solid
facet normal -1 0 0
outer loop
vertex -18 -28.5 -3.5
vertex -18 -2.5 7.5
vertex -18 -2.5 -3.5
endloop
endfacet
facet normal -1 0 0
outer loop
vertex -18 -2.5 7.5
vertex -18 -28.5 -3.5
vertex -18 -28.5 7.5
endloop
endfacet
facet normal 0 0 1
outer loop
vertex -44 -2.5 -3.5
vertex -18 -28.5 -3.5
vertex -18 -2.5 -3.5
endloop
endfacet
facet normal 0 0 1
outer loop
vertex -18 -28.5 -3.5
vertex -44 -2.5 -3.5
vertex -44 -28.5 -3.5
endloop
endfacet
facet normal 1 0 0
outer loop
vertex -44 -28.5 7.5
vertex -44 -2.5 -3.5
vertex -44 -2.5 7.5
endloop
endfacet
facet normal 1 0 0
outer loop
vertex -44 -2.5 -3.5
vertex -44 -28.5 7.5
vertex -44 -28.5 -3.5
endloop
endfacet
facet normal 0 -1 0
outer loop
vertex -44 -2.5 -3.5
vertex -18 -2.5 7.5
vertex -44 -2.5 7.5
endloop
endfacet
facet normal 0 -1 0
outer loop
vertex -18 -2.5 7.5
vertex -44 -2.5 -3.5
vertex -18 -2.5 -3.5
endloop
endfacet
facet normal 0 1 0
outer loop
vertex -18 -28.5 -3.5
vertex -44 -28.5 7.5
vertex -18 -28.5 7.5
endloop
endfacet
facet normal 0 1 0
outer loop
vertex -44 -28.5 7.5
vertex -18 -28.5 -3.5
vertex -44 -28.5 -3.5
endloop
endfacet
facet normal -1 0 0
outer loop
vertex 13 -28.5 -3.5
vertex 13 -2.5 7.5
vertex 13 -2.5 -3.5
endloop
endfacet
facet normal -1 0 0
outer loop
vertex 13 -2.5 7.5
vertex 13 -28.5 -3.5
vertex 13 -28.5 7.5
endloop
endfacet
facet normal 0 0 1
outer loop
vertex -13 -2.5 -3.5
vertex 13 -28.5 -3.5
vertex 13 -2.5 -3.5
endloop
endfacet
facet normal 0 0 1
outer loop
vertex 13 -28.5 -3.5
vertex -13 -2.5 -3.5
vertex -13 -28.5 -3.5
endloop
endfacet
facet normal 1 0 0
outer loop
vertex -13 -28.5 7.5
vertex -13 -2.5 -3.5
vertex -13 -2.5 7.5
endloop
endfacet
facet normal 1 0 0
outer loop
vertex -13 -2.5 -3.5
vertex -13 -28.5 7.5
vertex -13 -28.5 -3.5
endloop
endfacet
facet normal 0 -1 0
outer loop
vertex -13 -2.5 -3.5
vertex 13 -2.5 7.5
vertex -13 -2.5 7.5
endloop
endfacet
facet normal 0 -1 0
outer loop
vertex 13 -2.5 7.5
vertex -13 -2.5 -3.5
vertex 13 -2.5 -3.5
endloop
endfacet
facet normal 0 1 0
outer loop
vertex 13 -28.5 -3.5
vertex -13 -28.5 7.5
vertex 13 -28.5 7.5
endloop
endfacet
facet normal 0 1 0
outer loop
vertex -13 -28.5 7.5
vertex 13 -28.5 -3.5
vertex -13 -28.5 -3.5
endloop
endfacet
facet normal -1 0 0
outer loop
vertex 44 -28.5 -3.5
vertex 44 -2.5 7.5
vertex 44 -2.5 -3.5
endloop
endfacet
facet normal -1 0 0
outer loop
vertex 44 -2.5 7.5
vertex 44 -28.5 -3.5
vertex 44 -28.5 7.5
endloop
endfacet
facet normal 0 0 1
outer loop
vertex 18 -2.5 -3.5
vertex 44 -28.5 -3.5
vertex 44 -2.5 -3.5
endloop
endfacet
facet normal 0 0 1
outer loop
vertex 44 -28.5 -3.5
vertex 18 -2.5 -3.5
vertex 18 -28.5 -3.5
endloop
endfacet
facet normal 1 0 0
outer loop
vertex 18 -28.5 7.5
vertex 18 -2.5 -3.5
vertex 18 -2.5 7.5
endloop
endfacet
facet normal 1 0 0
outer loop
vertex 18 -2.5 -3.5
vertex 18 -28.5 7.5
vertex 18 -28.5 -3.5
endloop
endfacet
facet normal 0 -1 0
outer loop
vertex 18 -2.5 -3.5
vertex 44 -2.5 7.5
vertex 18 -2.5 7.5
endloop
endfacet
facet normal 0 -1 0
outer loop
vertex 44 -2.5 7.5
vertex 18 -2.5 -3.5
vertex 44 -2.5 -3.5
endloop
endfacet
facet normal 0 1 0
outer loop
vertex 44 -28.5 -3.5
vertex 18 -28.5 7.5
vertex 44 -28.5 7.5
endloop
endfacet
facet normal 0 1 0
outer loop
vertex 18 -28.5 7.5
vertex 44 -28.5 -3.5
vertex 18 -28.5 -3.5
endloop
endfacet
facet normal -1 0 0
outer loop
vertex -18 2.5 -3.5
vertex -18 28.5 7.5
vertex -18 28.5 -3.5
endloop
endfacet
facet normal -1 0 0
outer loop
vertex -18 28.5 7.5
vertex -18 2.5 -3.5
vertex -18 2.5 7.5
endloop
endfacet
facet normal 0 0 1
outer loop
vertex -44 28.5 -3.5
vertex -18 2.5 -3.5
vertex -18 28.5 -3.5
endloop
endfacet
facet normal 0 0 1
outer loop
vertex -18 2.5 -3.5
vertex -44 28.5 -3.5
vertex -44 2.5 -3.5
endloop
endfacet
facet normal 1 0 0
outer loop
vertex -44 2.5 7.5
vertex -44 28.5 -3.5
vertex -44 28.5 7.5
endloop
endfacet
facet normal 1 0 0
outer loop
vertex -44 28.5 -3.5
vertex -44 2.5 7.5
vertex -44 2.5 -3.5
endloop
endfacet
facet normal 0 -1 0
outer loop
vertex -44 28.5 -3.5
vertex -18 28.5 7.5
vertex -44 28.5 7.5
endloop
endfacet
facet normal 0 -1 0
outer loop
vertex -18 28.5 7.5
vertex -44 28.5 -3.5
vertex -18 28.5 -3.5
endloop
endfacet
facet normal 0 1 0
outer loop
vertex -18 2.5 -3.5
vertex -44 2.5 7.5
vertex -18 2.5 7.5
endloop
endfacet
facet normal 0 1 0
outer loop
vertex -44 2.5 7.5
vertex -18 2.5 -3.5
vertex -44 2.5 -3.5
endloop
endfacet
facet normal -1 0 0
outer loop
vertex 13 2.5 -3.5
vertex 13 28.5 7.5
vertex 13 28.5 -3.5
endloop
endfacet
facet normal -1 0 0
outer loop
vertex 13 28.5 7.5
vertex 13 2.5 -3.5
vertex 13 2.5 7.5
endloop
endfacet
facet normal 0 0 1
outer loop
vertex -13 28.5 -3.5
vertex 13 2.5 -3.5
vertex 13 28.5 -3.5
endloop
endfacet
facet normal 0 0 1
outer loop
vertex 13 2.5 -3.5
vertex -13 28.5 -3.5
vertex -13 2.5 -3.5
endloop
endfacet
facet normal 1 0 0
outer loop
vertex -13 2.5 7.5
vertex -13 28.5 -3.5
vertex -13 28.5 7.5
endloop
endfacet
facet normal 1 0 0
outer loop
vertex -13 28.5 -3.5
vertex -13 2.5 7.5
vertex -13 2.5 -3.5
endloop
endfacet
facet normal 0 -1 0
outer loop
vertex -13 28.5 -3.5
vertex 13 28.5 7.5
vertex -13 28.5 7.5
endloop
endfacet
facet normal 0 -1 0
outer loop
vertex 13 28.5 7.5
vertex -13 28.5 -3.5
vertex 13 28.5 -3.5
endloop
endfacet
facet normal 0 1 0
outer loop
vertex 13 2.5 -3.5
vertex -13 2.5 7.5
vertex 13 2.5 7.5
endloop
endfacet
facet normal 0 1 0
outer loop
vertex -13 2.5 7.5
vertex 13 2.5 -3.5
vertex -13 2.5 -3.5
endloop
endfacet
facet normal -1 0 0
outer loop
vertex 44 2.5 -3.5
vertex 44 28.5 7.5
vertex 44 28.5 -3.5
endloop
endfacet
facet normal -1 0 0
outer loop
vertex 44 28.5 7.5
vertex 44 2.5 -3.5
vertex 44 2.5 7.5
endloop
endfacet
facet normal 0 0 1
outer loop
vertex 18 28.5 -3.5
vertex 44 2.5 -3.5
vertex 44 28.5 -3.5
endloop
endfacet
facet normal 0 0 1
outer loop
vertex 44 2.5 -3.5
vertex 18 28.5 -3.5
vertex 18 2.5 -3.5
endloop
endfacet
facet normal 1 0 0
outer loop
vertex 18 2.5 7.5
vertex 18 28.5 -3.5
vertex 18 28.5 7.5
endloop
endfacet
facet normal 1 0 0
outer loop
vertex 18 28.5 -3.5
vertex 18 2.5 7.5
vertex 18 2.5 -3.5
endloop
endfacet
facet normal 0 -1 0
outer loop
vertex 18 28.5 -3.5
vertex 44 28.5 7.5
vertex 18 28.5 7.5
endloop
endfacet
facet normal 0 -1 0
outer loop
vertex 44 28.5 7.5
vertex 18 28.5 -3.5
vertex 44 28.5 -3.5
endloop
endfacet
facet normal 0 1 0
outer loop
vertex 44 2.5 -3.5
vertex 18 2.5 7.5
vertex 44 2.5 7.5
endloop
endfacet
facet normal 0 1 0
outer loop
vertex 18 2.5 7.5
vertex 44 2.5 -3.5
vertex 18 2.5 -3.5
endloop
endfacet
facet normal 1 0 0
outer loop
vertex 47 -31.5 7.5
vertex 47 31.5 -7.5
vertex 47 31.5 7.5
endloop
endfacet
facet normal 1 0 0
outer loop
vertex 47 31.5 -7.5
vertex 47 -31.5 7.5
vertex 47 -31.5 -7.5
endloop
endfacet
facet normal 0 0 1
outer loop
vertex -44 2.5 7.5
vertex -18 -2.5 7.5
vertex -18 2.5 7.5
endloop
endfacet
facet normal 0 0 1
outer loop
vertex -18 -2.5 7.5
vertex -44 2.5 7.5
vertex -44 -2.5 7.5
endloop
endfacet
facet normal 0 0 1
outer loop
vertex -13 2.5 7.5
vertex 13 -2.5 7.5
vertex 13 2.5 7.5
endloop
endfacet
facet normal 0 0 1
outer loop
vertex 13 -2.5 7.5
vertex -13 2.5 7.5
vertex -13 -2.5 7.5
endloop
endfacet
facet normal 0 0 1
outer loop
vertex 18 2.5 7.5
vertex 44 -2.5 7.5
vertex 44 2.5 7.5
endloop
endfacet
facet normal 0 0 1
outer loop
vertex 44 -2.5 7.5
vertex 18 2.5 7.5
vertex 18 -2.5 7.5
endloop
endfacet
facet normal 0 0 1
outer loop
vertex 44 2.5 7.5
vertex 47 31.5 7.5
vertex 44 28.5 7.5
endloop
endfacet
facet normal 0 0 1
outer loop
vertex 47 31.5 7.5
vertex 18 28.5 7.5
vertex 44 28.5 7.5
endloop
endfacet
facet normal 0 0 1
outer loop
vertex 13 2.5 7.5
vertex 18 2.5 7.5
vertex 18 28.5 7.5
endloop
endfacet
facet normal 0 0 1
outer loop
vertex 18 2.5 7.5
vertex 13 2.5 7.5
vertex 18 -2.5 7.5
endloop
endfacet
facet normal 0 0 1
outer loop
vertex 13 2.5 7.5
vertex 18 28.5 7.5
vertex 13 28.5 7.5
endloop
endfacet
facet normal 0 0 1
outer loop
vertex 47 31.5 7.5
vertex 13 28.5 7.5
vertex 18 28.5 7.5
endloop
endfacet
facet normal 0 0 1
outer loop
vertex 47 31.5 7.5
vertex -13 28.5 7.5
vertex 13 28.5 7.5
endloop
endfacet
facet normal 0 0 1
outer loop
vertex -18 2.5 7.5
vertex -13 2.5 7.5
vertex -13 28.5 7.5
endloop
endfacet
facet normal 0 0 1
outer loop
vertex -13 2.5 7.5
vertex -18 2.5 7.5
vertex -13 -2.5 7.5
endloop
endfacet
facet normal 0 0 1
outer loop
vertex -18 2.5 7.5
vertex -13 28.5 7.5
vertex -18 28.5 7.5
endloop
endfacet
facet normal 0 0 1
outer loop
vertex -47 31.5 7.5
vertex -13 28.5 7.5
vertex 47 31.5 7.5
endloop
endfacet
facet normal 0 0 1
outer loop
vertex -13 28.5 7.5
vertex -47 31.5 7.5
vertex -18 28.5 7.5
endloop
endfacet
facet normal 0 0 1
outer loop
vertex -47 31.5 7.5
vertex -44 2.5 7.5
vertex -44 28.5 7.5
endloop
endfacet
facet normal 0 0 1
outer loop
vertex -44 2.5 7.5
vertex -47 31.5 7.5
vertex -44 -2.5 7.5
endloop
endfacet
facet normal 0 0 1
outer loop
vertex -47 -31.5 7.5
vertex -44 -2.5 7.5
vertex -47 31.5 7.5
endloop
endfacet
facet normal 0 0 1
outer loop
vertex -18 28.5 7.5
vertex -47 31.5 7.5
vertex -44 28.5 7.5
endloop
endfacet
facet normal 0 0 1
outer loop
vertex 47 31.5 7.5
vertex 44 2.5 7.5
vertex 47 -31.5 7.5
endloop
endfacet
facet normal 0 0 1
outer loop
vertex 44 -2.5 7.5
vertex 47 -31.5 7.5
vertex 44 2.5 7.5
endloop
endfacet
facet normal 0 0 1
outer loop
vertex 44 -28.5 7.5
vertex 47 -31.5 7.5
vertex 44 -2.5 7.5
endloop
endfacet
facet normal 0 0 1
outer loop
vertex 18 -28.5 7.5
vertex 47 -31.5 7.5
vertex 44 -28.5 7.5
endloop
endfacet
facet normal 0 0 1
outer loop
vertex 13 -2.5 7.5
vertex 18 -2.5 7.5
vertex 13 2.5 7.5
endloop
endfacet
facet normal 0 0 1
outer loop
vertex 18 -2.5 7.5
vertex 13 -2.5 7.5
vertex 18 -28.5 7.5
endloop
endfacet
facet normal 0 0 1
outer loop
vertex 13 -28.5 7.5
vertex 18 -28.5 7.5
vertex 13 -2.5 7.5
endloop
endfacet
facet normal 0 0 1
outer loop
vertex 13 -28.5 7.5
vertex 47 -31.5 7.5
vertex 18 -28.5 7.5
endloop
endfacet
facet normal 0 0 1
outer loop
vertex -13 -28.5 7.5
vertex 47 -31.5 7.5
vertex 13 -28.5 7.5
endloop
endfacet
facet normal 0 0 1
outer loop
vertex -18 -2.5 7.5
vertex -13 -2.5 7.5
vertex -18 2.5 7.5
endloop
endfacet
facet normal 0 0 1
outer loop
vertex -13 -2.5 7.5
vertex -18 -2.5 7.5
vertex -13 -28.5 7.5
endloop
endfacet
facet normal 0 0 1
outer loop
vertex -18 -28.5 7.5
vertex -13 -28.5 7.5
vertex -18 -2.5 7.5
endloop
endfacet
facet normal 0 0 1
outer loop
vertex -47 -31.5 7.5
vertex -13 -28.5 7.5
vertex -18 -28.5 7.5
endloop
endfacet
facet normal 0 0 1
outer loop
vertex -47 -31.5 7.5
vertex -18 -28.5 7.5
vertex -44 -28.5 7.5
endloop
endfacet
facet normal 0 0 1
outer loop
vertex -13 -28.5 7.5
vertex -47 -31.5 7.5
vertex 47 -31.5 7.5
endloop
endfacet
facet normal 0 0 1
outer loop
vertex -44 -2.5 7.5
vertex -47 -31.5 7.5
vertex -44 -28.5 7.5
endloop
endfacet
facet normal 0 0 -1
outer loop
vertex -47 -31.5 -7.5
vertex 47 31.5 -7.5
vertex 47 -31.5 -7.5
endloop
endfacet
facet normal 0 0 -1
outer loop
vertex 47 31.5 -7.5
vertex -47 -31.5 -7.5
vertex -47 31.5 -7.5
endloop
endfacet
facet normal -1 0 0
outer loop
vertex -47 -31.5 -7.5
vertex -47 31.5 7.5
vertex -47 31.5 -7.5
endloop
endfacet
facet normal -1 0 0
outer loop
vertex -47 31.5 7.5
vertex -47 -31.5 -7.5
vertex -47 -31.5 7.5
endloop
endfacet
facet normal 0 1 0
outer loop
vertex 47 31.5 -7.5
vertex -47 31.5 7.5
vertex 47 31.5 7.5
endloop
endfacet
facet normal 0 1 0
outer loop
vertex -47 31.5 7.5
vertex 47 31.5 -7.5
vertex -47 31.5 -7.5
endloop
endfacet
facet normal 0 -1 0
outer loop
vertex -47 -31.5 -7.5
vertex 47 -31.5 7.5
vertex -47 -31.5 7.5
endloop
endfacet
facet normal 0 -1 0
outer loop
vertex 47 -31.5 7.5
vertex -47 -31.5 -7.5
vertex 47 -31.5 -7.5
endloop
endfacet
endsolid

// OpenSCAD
$fn = 32;

// ----------------------------------------------------------------------
// Pocket plate 94 x 63 x 15
// 2 x 3 pockets 26 mm square, 11 mm deep
// ----------------------------------------------------------------------

// --- parameters (mm) ---
thickness = 15;  // plate thickness
floor_t = 4;     // material left under each pocket
pocket = 26;     // pocket side length
pitch_x = 31;    // pocket pitch along X
pitch_y = 31;    // pocket pitch along Y
cols = 3;        // pockets per row
rows = 2;        // rows of pockets

// --- derived feature positions (mm) ---
depth = thickness - floor_t;        // = 11   pocket depth, down to the floor
span_x = (cols - 1) * pitch_x;      // = 62   distance between outer pockets
span_y = (rows - 1) * pitch_y;      // = 31   distance between outer pocket rows
origin_x = -span_x / 2;             // = -31   X of the first pocket
origin_y = -span_y / 2;             // = -15.5   Y of the first pocket
plate = [span_x + pocket + 6, span_y + pocket + 6, thickness];  // = [94, 63, 15]   overall size: pockets plus 3 mm of wall on each side
feature_centers = [
  [origin_x + 0 * pitch_x, origin_y + 0 * pitch_y],
  [origin_x + 1 * pitch_x, origin_y + 0 * pitch_y],
  [origin_x + 2 * pitch_x, origin_y + 0 * pitch_y],
  [origin_x + 0 * pitch_x, origin_y + 1 * pitch_y],
  [origin_x + 1 * pitch_x, origin_y + 1 * pitch_y],
  [origin_x + 2 * pitch_x, origin_y + 1 * pitch_y]
];   // pocket centres, used verbatim by the cutter loop

// plate outline, then one pocket per centre in feature_centers
difference() {
  cube(plate, center = true);
  for (centre = feature_centers)
    translate([centre[0] - pocket / 2, centre[1] - pocket / 2, plate[2] / 2 - depth])
      cube([pocket, pocket, depth + 1]);  // centred on the declared pocket centre
}
